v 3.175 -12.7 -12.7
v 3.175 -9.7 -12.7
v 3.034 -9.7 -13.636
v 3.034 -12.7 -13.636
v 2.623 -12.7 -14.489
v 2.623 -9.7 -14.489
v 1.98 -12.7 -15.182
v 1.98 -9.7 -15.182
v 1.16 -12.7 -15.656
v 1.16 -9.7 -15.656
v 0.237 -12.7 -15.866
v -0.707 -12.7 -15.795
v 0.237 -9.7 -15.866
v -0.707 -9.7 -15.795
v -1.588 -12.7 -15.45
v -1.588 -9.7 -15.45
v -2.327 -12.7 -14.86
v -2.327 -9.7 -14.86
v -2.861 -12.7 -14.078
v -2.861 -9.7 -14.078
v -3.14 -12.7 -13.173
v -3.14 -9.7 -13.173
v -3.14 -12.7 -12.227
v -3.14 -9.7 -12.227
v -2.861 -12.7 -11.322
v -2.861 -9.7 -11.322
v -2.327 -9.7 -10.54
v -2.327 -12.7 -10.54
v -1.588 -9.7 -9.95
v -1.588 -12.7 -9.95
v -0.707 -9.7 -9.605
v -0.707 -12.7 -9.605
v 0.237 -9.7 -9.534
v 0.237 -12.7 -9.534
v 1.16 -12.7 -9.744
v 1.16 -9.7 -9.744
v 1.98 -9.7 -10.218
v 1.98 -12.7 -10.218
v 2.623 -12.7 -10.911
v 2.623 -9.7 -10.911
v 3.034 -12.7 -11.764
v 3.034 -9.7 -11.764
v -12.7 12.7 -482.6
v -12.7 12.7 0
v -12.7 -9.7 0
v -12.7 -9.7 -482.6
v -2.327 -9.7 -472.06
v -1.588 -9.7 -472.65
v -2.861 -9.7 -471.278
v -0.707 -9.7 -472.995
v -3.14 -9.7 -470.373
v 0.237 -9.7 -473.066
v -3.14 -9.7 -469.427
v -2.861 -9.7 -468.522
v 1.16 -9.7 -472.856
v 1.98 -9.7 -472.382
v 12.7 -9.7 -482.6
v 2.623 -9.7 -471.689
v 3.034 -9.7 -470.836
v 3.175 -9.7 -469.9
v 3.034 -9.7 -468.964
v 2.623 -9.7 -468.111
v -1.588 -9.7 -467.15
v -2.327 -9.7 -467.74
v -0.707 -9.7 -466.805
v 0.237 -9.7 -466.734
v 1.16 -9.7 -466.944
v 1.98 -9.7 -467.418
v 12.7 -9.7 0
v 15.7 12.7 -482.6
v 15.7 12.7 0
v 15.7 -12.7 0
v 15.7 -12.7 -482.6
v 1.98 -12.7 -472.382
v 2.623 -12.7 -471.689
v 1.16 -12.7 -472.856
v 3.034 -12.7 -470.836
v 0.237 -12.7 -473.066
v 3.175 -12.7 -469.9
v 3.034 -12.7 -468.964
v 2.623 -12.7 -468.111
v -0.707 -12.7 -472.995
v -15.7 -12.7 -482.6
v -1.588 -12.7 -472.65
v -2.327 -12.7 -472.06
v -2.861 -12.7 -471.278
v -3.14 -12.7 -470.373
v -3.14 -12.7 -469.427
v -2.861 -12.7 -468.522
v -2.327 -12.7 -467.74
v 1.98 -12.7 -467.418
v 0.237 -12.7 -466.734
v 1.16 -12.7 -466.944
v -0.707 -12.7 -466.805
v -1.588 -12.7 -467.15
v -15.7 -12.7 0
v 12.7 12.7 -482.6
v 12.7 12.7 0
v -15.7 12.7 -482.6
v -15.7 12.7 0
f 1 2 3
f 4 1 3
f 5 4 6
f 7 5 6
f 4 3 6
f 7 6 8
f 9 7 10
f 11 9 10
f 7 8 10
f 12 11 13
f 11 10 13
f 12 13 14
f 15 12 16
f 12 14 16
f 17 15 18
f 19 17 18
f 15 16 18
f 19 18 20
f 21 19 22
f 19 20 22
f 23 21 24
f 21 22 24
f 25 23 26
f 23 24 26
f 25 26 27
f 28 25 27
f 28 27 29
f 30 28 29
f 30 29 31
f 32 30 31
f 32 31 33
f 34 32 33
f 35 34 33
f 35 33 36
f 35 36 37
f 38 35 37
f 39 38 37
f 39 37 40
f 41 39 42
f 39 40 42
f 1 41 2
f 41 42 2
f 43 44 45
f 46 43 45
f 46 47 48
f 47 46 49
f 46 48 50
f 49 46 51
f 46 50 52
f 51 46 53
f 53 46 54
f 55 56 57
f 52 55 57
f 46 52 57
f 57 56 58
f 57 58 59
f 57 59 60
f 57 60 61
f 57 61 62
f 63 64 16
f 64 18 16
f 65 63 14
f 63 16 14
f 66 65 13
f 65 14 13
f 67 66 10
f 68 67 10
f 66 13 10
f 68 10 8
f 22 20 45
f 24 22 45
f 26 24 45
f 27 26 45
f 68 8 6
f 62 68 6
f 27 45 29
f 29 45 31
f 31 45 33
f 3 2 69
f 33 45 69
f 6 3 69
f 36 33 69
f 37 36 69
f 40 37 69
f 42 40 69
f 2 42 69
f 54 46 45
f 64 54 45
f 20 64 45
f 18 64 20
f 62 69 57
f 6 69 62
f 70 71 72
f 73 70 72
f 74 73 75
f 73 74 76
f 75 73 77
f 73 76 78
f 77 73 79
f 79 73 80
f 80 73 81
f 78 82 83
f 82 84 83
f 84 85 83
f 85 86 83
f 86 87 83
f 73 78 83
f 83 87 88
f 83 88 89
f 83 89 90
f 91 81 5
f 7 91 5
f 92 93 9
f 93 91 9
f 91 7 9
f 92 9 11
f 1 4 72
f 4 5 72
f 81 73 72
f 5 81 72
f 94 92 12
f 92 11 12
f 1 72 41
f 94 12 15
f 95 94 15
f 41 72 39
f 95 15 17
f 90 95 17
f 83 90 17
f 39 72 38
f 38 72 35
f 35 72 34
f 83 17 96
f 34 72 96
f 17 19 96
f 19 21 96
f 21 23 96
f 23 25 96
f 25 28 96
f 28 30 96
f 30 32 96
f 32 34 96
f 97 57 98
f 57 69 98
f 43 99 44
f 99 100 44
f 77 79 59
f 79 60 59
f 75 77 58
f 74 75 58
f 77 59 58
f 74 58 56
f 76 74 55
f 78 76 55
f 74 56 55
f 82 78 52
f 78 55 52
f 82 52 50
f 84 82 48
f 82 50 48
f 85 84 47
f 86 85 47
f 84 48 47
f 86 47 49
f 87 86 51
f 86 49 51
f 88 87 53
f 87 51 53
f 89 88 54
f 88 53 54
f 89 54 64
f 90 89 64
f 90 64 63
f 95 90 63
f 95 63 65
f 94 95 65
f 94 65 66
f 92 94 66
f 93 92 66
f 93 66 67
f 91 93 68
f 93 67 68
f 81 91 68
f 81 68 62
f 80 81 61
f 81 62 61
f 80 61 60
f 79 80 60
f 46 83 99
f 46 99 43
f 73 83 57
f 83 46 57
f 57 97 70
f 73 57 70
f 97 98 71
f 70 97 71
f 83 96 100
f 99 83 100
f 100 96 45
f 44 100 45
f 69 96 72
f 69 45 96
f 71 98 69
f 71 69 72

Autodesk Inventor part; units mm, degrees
ref_plane "YZ Plane" through (0, 0, 0) normal (1, 0, 0) x (0, 1, 0)
ref_plane "XZ Plane" through (0, 0, 0) normal (0, 1, 0) x (-1, 0, 0)
ref_plane "XY Plane" through (0, 0, 0) normal (0, 0, 1) x (1, 0, 0)
sketch "Sketch1" plane through (0, 0, 0) normal (0, 0, 1) x (1, 0, 0)
  line L0 (-15.7, 12.7) -> (-12.7, 12.7)
  line L1 (-12.7, 12.7) -> (-12.7, -9.7)
  line L2 (-12.7, -9.7) -> (12.7, -9.7)
  line L3 (12.7, -9.7) -> (12.7, 12.7)
  line L4 (12.7, 12.7) -> (15.7, 12.7)
  line L5 (15.7, 12.7) -> (15.7, -12.7)
  line L6 (15.7, -12.7) -> (-15.7, -12.7)
  line L7 (-15.7, -12.7) -> (-15.7, 12.7)
  point P0 (0, 0)
  dimension "d0" = 3
  dimension "d2" = 3
  dimension "d3" = 25.4
  dimension "d4" = 31.4
  dimension "d5" = 15.7
  dimension "d7" = 12.7
  dimension "d8" = 3
extrude "Extrusion1" add sketch "Sketch1" against normal blind 482.6
sketch "Sketch3" plane through (-12.7, -9.7, 0) normal (0, 1, 0) x (1, 0, 0)
  line L0 (0, 0) -> (25.4, 0) projected
  line L1 (25.4, 0) -> (25.4, 482.6) projected
  line L2 (0, 482.6) -> (25.4, 482.6) projected
  line L3 (0, 0) -> (0, 482.6) projected
  line L4 (0, 0) -> (0, 25.4) construction
  line L5 (0, 25.4) -> (25.4, 25.4) construction
  line L6 (25.4, 25.4) -> (25.4, 0) construction
  line L7 (25.4, 0) -> (0, 0) construction
  line L8 (12.7, 0) -> (12.7, 25.4) construction
  line L9 (0, 12.7) -> (25.4, 12.7) construction
  line L10 (0, 482.6) -> (25.4, 482.6) construction
  line L11 (25.4, 482.6) -> (25.4, 457.2) construction
  line L12 (25.4, 457.2) -> (0, 457.2) construction
  line L13 (0, 457.2) -> (0, 482.6) construction
  line L14 (12.7, 457.2) -> (12.7, 482.6) construction
  line L15 (0, 469.9) -> (25.4, 469.9) construction
  circle A0 centre (12.7, 469.9) radius 3.175
  circle A1 centre (12.7, 12.7) radius 3.175
  dimension "d15" = 25.4
  dimension "d16" = 25.4
  dimension "d17" = 6.35
  dimension "d18" = 6.35
extrude "Extrusion3" cut sketch "Sketch3" against normal blind 10 contours A0 | A1
equation "\"d2\" = d0"
equation "\"d5\" = 0.5 * d4"
equation "\"d7\" = 0.5 * d3"
equation "\"d8\" = d0"
properties part number "19in c-channel"
